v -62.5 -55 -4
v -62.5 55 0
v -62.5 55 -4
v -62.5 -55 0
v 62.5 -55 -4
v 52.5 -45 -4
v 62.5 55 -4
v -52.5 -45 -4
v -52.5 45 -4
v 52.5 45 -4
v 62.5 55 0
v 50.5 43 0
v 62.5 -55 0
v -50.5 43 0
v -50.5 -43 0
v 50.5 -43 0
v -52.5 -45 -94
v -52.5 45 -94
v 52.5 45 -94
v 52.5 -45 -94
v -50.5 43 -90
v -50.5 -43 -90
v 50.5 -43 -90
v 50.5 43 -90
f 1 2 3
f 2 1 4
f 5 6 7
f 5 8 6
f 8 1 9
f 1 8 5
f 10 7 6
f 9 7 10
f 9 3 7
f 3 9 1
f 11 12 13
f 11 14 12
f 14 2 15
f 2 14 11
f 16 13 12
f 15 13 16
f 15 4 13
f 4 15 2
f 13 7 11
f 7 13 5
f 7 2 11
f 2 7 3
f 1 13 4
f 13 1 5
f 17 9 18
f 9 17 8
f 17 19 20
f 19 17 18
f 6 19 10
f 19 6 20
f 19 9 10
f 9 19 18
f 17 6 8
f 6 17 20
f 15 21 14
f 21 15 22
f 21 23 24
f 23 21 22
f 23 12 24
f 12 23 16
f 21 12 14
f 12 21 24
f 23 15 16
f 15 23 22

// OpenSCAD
width = 105;
depth = 90;
height = 90;
wallThickness = 4;
borderHeight = 4;
borderwidth = 10;

center = true;

rotate([0,180,0]){
    difference() {

        union() {
            translate([0,0,(borderHeight)/2]) {
                cube([width+borderwidth*2,depth+borderwidth*2,borderHeight], center);
            }
            translate([0,0,(height+borderHeight)/2]) {
                cube([width,depth,height+borderHeight], center);
            }
        }
        translate([0,0,0]) {
            cube([width-wallThickness,depth-wallThickness,height*2], center);
        }
    }
}
